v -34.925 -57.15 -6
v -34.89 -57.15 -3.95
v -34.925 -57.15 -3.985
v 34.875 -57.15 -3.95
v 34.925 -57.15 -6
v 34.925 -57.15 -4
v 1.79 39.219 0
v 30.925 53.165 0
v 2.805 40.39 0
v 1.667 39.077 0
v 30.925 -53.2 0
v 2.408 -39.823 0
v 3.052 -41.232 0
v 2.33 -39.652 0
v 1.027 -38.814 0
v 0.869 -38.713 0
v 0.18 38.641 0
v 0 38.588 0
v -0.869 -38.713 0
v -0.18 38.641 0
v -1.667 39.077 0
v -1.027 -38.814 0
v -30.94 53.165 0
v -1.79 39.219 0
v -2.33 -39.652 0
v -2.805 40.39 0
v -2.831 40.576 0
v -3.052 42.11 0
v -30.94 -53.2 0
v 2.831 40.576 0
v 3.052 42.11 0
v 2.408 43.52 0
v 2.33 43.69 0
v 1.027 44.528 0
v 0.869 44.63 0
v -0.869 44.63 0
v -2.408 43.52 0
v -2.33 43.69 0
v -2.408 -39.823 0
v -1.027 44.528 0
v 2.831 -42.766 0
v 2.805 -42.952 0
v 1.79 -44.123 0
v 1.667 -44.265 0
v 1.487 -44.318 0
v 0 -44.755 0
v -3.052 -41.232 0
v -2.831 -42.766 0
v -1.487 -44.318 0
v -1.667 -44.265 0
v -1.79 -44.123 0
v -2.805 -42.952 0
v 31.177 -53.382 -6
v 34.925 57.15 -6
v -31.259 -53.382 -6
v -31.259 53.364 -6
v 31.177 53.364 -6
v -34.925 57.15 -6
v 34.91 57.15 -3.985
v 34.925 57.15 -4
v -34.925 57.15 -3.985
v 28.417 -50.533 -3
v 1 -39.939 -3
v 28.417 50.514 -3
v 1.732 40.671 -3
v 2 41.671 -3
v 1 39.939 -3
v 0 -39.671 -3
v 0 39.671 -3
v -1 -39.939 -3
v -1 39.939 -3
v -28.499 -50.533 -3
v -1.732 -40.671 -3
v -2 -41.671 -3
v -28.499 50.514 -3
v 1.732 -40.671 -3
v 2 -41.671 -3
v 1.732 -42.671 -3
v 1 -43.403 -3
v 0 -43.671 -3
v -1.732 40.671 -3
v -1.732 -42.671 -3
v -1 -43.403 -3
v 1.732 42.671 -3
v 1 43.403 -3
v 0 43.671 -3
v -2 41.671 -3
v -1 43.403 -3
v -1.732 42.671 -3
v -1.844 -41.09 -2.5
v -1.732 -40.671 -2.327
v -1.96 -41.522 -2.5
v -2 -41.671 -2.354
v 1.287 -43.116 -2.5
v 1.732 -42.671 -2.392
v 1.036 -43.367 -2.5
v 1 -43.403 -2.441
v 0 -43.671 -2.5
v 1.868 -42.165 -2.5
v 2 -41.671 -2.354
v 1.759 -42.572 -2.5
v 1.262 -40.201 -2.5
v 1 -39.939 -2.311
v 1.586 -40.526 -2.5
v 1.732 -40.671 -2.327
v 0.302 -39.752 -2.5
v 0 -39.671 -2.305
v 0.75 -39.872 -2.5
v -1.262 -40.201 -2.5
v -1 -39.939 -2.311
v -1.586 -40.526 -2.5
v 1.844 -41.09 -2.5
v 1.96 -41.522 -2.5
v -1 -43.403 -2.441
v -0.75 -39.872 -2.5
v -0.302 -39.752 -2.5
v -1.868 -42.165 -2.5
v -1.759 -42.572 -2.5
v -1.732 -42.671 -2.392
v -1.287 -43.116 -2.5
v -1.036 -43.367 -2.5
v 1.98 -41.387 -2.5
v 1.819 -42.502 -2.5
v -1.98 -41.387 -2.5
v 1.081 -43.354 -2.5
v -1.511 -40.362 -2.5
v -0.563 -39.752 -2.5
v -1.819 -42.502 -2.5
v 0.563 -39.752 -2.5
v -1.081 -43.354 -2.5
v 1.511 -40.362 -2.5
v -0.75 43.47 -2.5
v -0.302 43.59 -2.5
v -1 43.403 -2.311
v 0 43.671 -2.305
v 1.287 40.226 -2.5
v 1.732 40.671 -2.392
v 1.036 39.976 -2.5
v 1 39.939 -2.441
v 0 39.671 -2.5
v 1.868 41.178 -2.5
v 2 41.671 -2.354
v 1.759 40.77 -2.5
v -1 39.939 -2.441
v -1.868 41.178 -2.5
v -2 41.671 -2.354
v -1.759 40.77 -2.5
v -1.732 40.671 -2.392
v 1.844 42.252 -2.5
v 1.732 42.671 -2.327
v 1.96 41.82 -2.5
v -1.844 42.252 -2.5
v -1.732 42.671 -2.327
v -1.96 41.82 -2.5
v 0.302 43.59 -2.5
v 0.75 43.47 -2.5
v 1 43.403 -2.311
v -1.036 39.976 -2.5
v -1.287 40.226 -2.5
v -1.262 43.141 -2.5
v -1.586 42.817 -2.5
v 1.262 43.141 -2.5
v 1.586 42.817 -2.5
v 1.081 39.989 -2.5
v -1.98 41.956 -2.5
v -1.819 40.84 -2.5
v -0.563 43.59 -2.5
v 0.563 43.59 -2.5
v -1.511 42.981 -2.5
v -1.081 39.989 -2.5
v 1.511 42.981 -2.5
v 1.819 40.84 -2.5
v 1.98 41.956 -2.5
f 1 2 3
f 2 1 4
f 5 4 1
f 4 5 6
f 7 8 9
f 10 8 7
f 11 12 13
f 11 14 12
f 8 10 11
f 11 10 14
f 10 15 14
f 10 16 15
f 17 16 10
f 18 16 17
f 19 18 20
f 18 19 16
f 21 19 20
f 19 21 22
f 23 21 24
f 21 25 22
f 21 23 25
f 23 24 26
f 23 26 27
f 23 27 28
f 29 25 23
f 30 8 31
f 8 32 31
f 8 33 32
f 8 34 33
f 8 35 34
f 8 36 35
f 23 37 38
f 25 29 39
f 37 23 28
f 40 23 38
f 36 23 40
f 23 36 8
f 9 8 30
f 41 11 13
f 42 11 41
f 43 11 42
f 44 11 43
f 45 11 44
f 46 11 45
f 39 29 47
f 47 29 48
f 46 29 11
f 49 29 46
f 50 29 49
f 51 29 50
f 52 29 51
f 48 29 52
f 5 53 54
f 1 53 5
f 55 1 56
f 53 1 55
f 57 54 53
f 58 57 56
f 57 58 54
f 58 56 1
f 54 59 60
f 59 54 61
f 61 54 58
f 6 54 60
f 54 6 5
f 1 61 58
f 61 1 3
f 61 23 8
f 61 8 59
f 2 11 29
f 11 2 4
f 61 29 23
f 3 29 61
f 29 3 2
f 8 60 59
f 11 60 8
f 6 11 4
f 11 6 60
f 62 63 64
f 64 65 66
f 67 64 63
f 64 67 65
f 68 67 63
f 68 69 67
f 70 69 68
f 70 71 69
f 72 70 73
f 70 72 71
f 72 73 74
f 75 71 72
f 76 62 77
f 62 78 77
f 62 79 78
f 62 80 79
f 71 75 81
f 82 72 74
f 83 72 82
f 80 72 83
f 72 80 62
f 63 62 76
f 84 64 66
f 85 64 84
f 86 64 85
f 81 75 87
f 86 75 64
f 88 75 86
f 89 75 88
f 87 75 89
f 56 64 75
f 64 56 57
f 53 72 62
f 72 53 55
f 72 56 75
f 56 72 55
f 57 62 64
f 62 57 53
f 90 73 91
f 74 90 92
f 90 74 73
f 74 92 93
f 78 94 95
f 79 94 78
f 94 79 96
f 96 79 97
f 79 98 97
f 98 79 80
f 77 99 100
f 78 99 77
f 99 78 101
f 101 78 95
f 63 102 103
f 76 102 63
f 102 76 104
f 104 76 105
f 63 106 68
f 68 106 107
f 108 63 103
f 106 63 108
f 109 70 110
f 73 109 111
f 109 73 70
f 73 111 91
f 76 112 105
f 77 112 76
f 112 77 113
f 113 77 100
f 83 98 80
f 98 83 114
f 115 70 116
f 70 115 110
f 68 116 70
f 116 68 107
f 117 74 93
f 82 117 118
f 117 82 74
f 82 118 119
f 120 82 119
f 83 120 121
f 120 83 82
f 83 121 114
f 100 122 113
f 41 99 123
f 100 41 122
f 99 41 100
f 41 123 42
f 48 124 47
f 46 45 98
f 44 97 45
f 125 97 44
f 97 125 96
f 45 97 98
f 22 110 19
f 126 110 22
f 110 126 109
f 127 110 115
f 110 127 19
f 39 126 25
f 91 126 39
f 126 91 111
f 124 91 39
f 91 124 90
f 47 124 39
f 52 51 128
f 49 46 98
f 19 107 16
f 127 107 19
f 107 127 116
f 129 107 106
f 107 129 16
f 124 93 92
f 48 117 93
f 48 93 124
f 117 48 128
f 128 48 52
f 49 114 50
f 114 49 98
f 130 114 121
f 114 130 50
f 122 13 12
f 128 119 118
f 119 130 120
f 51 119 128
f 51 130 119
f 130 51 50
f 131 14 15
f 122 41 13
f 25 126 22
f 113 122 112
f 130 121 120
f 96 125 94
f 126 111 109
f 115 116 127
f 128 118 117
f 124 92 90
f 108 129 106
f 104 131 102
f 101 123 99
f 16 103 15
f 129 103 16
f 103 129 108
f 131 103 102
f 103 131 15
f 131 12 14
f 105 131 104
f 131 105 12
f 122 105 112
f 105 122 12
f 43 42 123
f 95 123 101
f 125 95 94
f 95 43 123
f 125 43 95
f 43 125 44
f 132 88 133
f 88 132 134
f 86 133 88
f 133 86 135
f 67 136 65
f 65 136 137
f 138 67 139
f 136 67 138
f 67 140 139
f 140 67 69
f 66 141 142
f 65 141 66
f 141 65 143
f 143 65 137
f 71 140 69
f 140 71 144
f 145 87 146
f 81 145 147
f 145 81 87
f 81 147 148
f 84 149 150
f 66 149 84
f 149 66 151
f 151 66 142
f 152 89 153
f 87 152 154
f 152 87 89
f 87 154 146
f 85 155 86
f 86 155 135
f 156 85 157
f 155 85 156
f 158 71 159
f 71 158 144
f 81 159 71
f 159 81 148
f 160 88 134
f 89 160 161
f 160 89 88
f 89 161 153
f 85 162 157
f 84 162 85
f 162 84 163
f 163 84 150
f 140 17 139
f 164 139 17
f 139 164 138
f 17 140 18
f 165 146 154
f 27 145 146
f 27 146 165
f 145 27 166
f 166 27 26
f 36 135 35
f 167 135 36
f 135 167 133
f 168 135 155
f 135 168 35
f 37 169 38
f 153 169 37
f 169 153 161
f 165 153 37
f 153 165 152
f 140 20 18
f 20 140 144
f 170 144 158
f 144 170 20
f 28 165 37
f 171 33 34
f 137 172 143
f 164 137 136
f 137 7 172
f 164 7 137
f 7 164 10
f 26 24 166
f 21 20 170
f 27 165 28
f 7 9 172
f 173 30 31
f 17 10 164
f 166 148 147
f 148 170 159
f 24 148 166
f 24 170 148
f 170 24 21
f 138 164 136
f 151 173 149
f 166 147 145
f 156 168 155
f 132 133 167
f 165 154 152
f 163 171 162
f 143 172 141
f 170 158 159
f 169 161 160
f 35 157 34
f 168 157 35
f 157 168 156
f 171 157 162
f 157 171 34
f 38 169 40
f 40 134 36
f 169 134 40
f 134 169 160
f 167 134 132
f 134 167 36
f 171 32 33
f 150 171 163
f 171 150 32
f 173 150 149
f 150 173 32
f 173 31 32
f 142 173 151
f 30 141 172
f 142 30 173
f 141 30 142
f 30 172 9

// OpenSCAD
/*
	WALLY - Wall Plate Customizer v1.4
	by TheNewHobbyist 2013 (http://thenewhobbyist.com)
	http://www.thingiverse.com/thing:47956

	Most of the connectors used with this thing are panel mount connectors from
	www.DataPro.net I can't vouch for their quality but they did have easy to
	find dimensions for their products so I used them.

	This could be tightened up considerably but I thought I'd get it out there for people
	to experiment with before I lose my mind staring at it too long. Also this is my
	first OpenSCAD model so cut me some slack ;)

	Notes:

	* The plug types "Duplex Outlet", "Long_Toggle Switch", "Toggle Switch", and "Rocker"
	  will all use the entire plate when selected in top or bottom configuration. The
	  other selection (if not "none" will be selected.

	* "None" and "Blank should not be considered equal. if "None" is selected for one of
	  the two holes on a plate the other selection will be centered on that plate. If
	  "Blank" is selected that plug location will remain blank but the other selection
	  will NOT move into a centered position.

		Change Log:

		v1.4 - The "I've never used OpenSCAD in my life until yesterday" edition! :D
		- Added Keystone Jack - Dual to allow a pair of keystone jacks side-by-side.
		- Fixed a bug where the first plate spot did not build unless one of the "full plate" options are used
		- Fixed: "Liberation Mono:Bol" -> "Liberation Mono:Bold"
		- Improved layout of code... to me, at least. :)

		v1.3
		ADDED: 3 new sizes for plate export: Standard, Junior-Jumbo, and Jumbo.

		v1.2
		ADDED: Long Toggle Switch for laird

		v1.1
		UPDATED: Screw hole locations for designer and toggle plate types.
		UPDATED: Hole size for designer plate type.
		UPDATED: Outlet hole spacing

*/

  //////////////////////////
 // Customizer Settings: //
//////////////////////////

//How big are we talkin' here?
plate_width = 1; //	[1:5]

// Bigger hole in your wall? Try this
plate_size = 0; // [0:Standard, 1:Junior-Jumbo, 2:Jumbo]

//Pick a plug or full plate type
1st_plate = "none";								// ["none":None, "blank":Blank Port, "toggle":Full Plate - Toggle Switch, "long_toggle":Full Plate - Long Toggle Switch, "outlet":Full Plate - Duplex Outlet, "L5-30P", "rocker":Full Plate - Rocker/Designer Plate, "keystone1":Keystone Jack, "keystone2":Keystone Jack - Dual, "vga":VGA Port, "hdmi":HDMI Port, "dvi":DVI-I Port, "displayport":Displayport, "cat5e":Cat5e/Cat6 Port, "usb-a":USB-A Port, "usb-b":USB-B Port, "firewire":Firewire IEEE 1394 Port, "db09":DB-09 Port, "ps2":PS2 Port, "f-type": F-Type/Coaxial Port,"svideo":S-Video Port, "stereo":Stereo Headphone Jack]
//Pick a bottom plug type or leave as none
1st_plate_bottom_hole = "none";					// ["none":None, "blank":Blank Port, "keystone1":Keystone Jack, "keystone2":Keystone Jack - Dual, "vga":VGA Port, "hdmi":HDMI Port, "dvi":DVI-I Port, "displayport":Displayport, "cat5e":Cat5e/Cat6 Port, "usb-a":USB-A Port, "usb-b":USB-B Port, "firewire":Firewire IEEE 1394 Port, "db09":DB-09 Port, "ps2":PS2 Port, "f-type": F-Type/Coaxial Port,"svideo":S-Video Port, "stereo":Stereo Headphone Jack]
//Add some text on the top
1st_plate_top_text = "";
//Add some text on the bottom
1st_plate_bottom_text = "";
//Pick a plug or full plate type
2nd_plate = "none";								// ["none":None, "blank":Blank Port, "toggle":Full Plate - Toggle Switch, "long_toggle":Full Plate - Long Toggle Switch, "outlet":Full Plate - Duplex Outlet, "L5-30P", "rocker":Full Plate - Rocker/Designer Plate, "keystone1":Keystone Jack, "keystone2":Keystone Jack - Dual, "vga":VGA Port, "hdmi":HDMI Port, "dvi":DVI-I Port, "displayport":Displayport, "cat5e":Cat5e/Cat6 Port, "usb-a":USB-A Port, "usb-b":USB-B Port, "firewire":Firewire IEEE 1394 Port, "db09":DB-09 Port, "ps2":PS2 Port, "f-type": F-Type/Coaxial Port,"svideo":S-Video Port, "stereo":Stereo Headphone Jack]
//Pick a bottom plug type or leave as none
2nd_plate_bottom_hole = "none";					// ["none":None, "blank":Blank Port, "keystone1":Keystone Jack, "keystone2":Keystone Jack - Dual, "vga":VGA Port, "hdmi":HDMI Port, "dvi":DVI-I Port, "displayport":Displayport, "cat5e":Cat5e/Cat6 Port, "usb-a":USB-A Port, "usb-b":USB-B Port, "firewire":Firewire IEEE 1394 Port, "db09":DB-09 Port, "ps2":PS2 Port, "f-type": F-Type/Coaxial Port,"svideo":S-Video Port, "stereo":Stereo Headphone Jack]
//Add some text on the top
2nd_plate_top_text = "";
//Add some text on the bottom
2nd_plate_bottom_text = "";
//Pick a plug or full plate type
3rd_plate = "none";								// ["none":None, "blank":Blank Port, "toggle":Full Plate - Toggle Switch, "long_toggle":Full Plate - Long Toggle Switch, "outlet":Full Plate - Duplex Outlet, "L5-30P", "rocker":Full Plate - Rocker/Designer Plate, "keystone1":Keystone Jack, "keystone2":Keystone Jack - Dual, "vga":VGA Port, "hdmi":HDMI Port, "dvi":DVI-I Port, "displayport":Displayport, "cat5e":Cat5e/Cat6 Port, "usb-a":USB-A Port, "usb-b":USB-B Port, "firewire":Firewire IEEE 1394 Port, "db09":DB-09 Port, "ps2":PS2 Port, "f-type": F-Type/Coaxial Port,"svideo":S-Video Port, "stereo":Stereo Headphone Jack]
//Pick a bottom plug type or leave as none
3rd_plate_bottom_hole = "none";					// ["none":None, "blank":Blank Port, "keystone1":Keystone Jack, "keystone2":Keystone Jack - Dual, "vga":VGA Port, "hdmi":HDMI Port, "dvi":DVI-I Port, "displayport":Displayport, "cat5e":Cat5e/Cat6 Port, "usb-a":USB-A Port, "usb-b":USB-B Port, "firewire":Firewire IEEE 1394 Port, "db09":DB-09 Port, "ps2":PS2 Port, "f-type": F-Type/Coaxial Port,"svideo":S-Video Port, "stereo":Stereo Headphone Jack]
//Add some text on the top
3rd_plate_top_text = "";
//Add some text on the bottom
3rd_plate_bottom_text = "";
//Pick a plug or full plate type
4th_plate = "none";								// ["none":None, "blank":Blank Port, "toggle":Full Plate - Toggle Switch, "long_toggle":Full Plate - Long Toggle Switch, "outlet":Full Plate - Duplex Outlet, "L5-30P", "rocker":Full Plate - Rocker/Designer Plate, "keystone1":Keystone Jack, "keystone2":Keystone Jack - Dual, "vga":VGA Port, "hdmi":HDMI Port, "dvi":DVI-I Port, "displayport":Displayport, "cat5e":Cat5e/Cat6 Port, "usb-a":USB-A Port, "usb-b":USB-B Port, "firewire":Firewire IEEE 1394 Port, "db09":DB-09 Port, "ps2":PS2 Port, "f-type": F-Type/Coaxial Port,"svideo":S-Video Port, "stereo":Stereo Headphone Jack]
//Pick a bottom plug type or leave as none
4th_plate_bottom_hole = "none";					// ["none":None, "blank":Blank Port, "keystone1":Keystone Jack, "keystone2":Keystone Jack - Dual, "vga":VGA Port, "hdmi":HDMI Port, "dvi":DVI-I Port, "displayport":Displayport, "cat5e":Cat5e/Cat6 Port, "usb-a":USB-A Port, "usb-b":USB-B Port, "firewire":Firewire IEEE 1394 Port, "db09":DB-09 Port, "ps2":PS2 Port, "f-type": F-Type/Coaxial Port,"svideo":S-Video Port, "stereo":Stereo Headphone Jack]
//Add some text on the top
4th_plate_top_text = "";
//Add some text on the bottom
4th_plate_bottom_text = "";
//Pick a plug or full plate type
5th_plate = "none";								// ["none":None, "blank":Blank Port, "toggle":Full Plate - Toggle Switch, "long_toggle":Full Plate - Long Toggle Switch, "outlet":Full Plate - Duplex Outlet, "L5-30P", "rocker":Full Plate - Rocker/Designer Plate, "keystone1":Keystone Jack, "keystone2":Keystone Jack - Dual, "vga":VGA Port, "hdmi":HDMI Port, "dvi":DVI-I Port, "displayport":Displayport, "cat5e":Cat5e/Cat6 Port, "usb-a":USB-A Port, "usb-b":USB-B Port, "firewire":Firewire IEEE 1394 Port, "db09":DB-09 Port, "ps2":PS2 Port, "f-type": F-Type/Coaxial Port,"svideo":S-Video Port, "stereo":Stereo Headphone Jack]
//Pick a bottom plug type or leave as none
5th_plate_bottom_hole = "none";					// ["none":None, "blank":Blank Port, "keystone1":Keystone Jack, "keystone2":Keystone Jack - Dual, "vga":VGA Port, "hdmi":HDMI Port, "dvi":DVI-I Port, "displayport":Displayport, "cat5e":Cat5e/Cat6 Port, "usb-a":USB-A Port, "usb-b":USB-B Port, "firewire":Firewire IEEE 1394 Port, "db09":DB-09 Port, "ps2":PS2 Port, "f-type": F-Type/Coaxial Port,"svideo":S-Video Port, "stereo":Stereo Headphone Jack]
//Add some text on the top
5th_plate_top_text = "";
//Add some text on the bottom
5th_plate_bottom_text = "";

  //////////////////////
 // Static Settings: //
//////////////////////

module GoAwayCustomizer()
{
	// This module is here to stop Customizer from picking up the variables below
}

plates = [1st_plate, 2nd_plate, 3rd_plate, 4th_plate, 5th_plate];
bottom_plates = [1st_plate_bottom_hole, 2nd_plate_bottom_hole, 3rd_plate_bottom_hole, 4th_plate_bottom_hole, 5th_plate_bottom_hole];
top_texts = [1st_plate_top_text, 2nd_plate_top_text, 3rd_plate_top_text, 4th_plate_top_text, 5th_plate_top_text];
bottom_texts = [1st_plate_bottom_text, 2nd_plate_bottom_text, 3rd_plate_bottom_text, 4th_plate_bottom_text, 5th_plate_bottom_text];

l_offset = [34.925, 39.6875, 44.45];
r_offset = [34.925, 39.6875, 44.45];
spacer = [0, 0, 46.0375, 92.075, 138.1125, 184.15];
solid_plate_width = l_offset[plate_size] + spacer[plate_width] + r_offset[plate_size];

height_sizes = [114.3, 123.825, 133.35];

height = 114.3; //plate height (static)
gang_width = [0, 69.86, 115.824, 161.925, 206.375, 254]; // Plate widths (standard)

edgewidth = solid_plate_width + 10; // Bevel setting for top and bottom
rightbevel = solid_plate_width - 4; // Bevel for right side (scales)

left_offset = 34.925; // Offset first hole position
switch_offset = 46.0375; // Offset all additional holes
thinner_offset = [0, 0.92, 0.95, 0.96, 0.97, 0.973]; // Manual fix for right side wackiness

positions = [height_sizes[plate_size] / 2, height_sizes[plate_size] / 2 - 14.25, height_sizes[plate_size] / 2 + 14.25];



  ///////////////////
 // Hole Control: //
///////////////////
module plate_text(text, offset, plate_number, size = 8)
{
    echo (positions[0]);
    translate([offset + (plate_size * 4.5), l_offset[plate_size] + (plate_number * switch_offset), 4])
    rotate([0, 0, 90])
    linear_extrude(40)
    text(text, halign = "center", size = size, font = "Liberation Mono:Bold");
    
}

module plate(plate = 1)
{
    plate_index = plate - 1; // indexes are zero based
    
    if (plates[plate_index] == "L5-30P")
    {
        plate_text(top_texts[plate_index], 20, plate_index);
        plate_text(bottom_texts[plate_index], 104, plate_index);
		translate([0, l_offset[plate_size] + switch_offset * plate_index, 0]) toggle_screws();
		translate([0, l_offset[plate_size] + switch_offset * plate_index, 0]) hole(plates[plate_index]);        
    }
    else if (plates[plate_index] == "toggle" || bottom_plates[plate_index] == "toggle")
    {
        plate_text(top_texts[plate_index], 20, plate_index);
        plate_text(bottom_texts[plate_index], 104, plate_index);
		translate([0, l_offset[plate_size] + switch_offset * plate_index, 0]) toggle_screws();
		translate([0, l_offset[plate_size] + switch_offset * plate_index, 0]) hole(plates[plate_index]);
    }
    else if (plates[plate_index] == "long_toggle" || bottom_plates[plate_index] == "long_toggle")
    {
        plate_text(top_texts[plate_index], 20, plate_index);
        plate_text(bottom_texts[plate_index], 104, plate_index);
		translate([0, l_offset[plate_size] + switch_offset * plate_index, 0]) toggle_screws();
		translate([0, l_offset[plate_size] + switch_offset * plate_index, 0]) hole(plates[plate_index]);
	}
	else if (plates[plate_index] == "rocker" || bottom_plates[plate_index] == "rocker")
	{
        plate_text(top_texts[plate_index], 21, plate_index);
        plate_text(bottom_texts[plate_index], 101, plate_index);
		translate([0, l_offset[plate_size] + switch_offset * plate_index, 0]) rocker_screws();
		translate([0, l_offset[plate_size] + switch_offset * plate_index, 0]) hole(plates[plate_index]);
	}
	else if (plates[plate_index] == "outlet" || bottom_plates[plate_index] == "outlet")
	{
        plate_text(top_texts[plate_index], 20, plate_index);
        plate_text(bottom_texts[plate_index], 104, plate_index);
        translate([0, l_offset[plate_size] + switch_offset * plate_index, 0]) hole(plates[plate_index]);
	}
	else if (bottom_plates[plate_index] == "none")
	{
        plate_text(top_texts[plate_index], 30, plate_index);
        plate_text(bottom_texts[plate_index], 94, plate_index);
		translate([0, l_offset[plate_size] + switch_offset * plate_index, 0]) box_screws();
		translate([positions[0], l_offset[plate_size] + switch_offset * plate_index, 0]) hole(plates[plate_index]);
	}
	else if (plates[plate_index] == "none")
	{
        plate_text(top_texts[plate_index], 20, plate_index);
        plate_text(bottom_texts[plate_index], 104, plate_index);
		translate([0, l_offset[plate_size] + switch_offset * plate_index, 0]) box_screws();
		translate([positions[0], l_offset[plate_size] + switch_offset * plate_index, 0]) hole(bottom_plates[plate_index]);
	}
    else if (plate_index >= 0)
    {
        plate_text(top_texts[plate_index], 30, plate_index);
        plate_text(bottom_texts[plate_index], 94, plate_index);
        translate([0, l_offset[plate_size] + switch_offset * plate_index, 0]) box_screws();
        translate([positions[1], l_offset[plate_size] + switch_offset * plate_index, 0]) hole(plates[plate_index]);
        translate([positions[2], l_offset[plate_size] + switch_offset * plate_index, 0]) hole(bottom_plates[plate_index]);
	}
}


  /////////////////
 // SolidWorks: //
/////////////////
module plate_solid(plate = 1)
{
    plate_index = plate - 1; // indexes are zero based

    echo("plate number: ", plate, "plate multiplier: ", plate_index, "plate index: ", plate_index);

	if (plates[plate_index] == "keystone1" && bottom_plates[plate_index] == "none")
	{
		translate([height_sizes[plate_size] / 2 + 14.3, l_offset[plate_size] - 11.5 + switch_offset * plate_index, -3.9]) hole("keystone_solid");
	}
	else if (plates[plate_index] == "keystone1" && bottom_plates[plate_index] != "outlet" && bottom_plates[plate_index] != "toggle" && bottom_plates[plate_index] != "rocker")
	{
		translate([height_sizes[plate_size] / 2, l_offset[plate_size] - 11.5 + switch_offset * plate_index, -3.9]) hole("keystone_solid");
	}

	if (bottom_plates[plate_index] == "keystone1" && plates[plate_index] == "none")
	{
		translate([height_sizes[plate_size] / 2 + 14.3, l_offset[plate_size] - 11.5 + switch_offset * plate_index, -3.9]) hole("keystone_solid");
	}
	else if (bottom_plates[plate_index] == "keystone1" && plates[plate_index] != "outlet" && plates[plate_index] != "toggle" && plates[plate_index] != "rocker")
	{
		translate([height_sizes[plate_size]/2 + 28.5, l_offset[plate_size] - 11.5 + switch_offset * plate_index, -3.9]) hole("keystone_solid");
	}



	if (plates[plate_index] == "keystone2" && bottom_plates[plate_index] == "none")
	{
		translate([height_sizes[plate_size] / 2 + 14.3, l_offset[plate_size] - 11.5 + switch_offset * plate_index, -3.9]) hole("keystone2_solid");
	}
	else if (plates[plate_index] == "keystone2" && bottom_plates[plate_index] != "outlet" && bottom_plates[plate_index] != "toggle" && bottom_plates[plate_index] != "rocker")
	{
		translate([height_sizes[plate_size] / 2, l_offset[plate_size] - 11.5 + switch_offset * plate_index, -3.9]) hole("keystone2_solid");
	}

	if (bottom_plates[plate_index] == "keystone2" && plates[plate_index] == "none")
	{
		translate([height_sizes[plate_size] / 2 + 14.3, l_offset[plate_size] - 11.5 + switch_offset * plate_index, -3.9]) hole("keystone2_solid");
	}
	else if (bottom_plates[plate_index] == "keystone2" && plates[plate_index] != "outlet" && plates[plate_index] != "toggle" && plates[plate_index] != "rocker")
	{
		translate([height_sizes[plate_size]/2 + 28.5, l_offset[plate_size] - 11.5 + switch_offset * plate_index, -3.9]) hole("keystone2_solid");
	}

}

  ///////////////////
 // PlateStation: //
///////////////////

//Plate size and bevel
module base_plate()
{
	difference()
	{
		cube([height_sizes[plate_size],solid_plate_width,6]);
		translate([-4.3, -5, 6.2]) rotate([0, 45, 0]) cube([6, edgewidth, 6]); //Top Bevel
		translate([height_sizes[plate_size] - 4.2, -5, 6.25]) rotate([0, 45, 0]) cube([6, edgewidth, 6]); //Bottom Bevel
		translate([height_sizes[plate_size] + 10, -4.4, 6.1]) rotate([0, 45, 90]) cube([6, height_sizes[plate_size] + 20, 6]); //Left Bevel (doesn't change)
		translate([height_sizes[plate_size] + 10, rightbevel, 6]) rotate([0, 45, 90]) cube([6, height_sizes[plate_size] + 10, 6]); //Right Bevel (scales right)
	}
}


// Thinning Plate
module plate_inner()
{
	scale([0.95,thinner_offset[plate_width],1])
	{
		translate([3,3,0])
		{
			difference()
			{
				cube([height_sizes[plate_size], solid_plate_width, 6]);
				translate([-4.3, -5, 6.2]) rotate([0, 45, 0]) cube([6, edgewidth, 6]); //Top Bevel
				translate([height_sizes[plate_size] - 4.2, -5, 6.25]) rotate([0, 45, 0]) cube([6, edgewidth, 6]); //Bottom Bevel
				translate([height_sizes[plate_size] + 10, -4.4, 6.1]) rotate([0, 45, 90]) cube([6, height_sizes[plate_size] + 20, 6]); //Left Bevel (doesn't change)
				translate([height_sizes[plate_size] + 10, rightbevel, 6]) rotate([0, 45, 90]) cube([6, height_sizes[plate_size] + 10, 6]); //Right Bevel (scales right)
			}
		}
	}
}

// Box screw holes
module box_screws()
{
	translate([height_sizes[plate_size] / 2 + 41.67125, 0, -1]) cylinder(r = 2, h = 10, $fn = 12);
	translate([height_sizes[plate_size] / 2 + 41.67125, 0, 3.5]) cylinder(r1 = 2, r2 = 3.3, h = 3);
	translate([height_sizes[plate_size] / 2 - 41.67125, 0, -1]) cylinder(r = 2, h = 10, $fn = 12);
	translate([height_sizes[plate_size] / 2 - 41.67125, 0, 3.5]) cylinder(r1 = 2, r2 = 3.3, h = 3);
	}

// Rocker/Designer screw holes
module rocker_screws()
{
	translate([height_sizes[plate_size] / 2 + 48.41875, 0, -1]) cylinder(r = 2, h = 10, $fn = 12);
	translate([height_sizes[plate_size] / 2 + 48.41875, 0, 3.5]) cylinder(r1 = 2, r2 = 3.3, h = 3);
	translate([height_sizes[plate_size] / 2 - 48.41875, 0, -1]) cylinder(r = 2, h = 10, $fn = 12);
	translate([height_sizes[plate_size] / 2 - 48.41875, 0, 3.5]) cylinder(r1 = 2, r2 = 3.3, h = 3);
}

// Toggle screw holes
module toggle_screws()
{
	translate([height_sizes[plate_size] / 2 + 30.1625, 0, -1]) cylinder(r = 2, h = 10, $fn = 12);
	translate([height_sizes[plate_size] / 2 + 30.1625, 0, 3.5]) cylinder(r1 = 2, r2 = 3.3, h = 3);
	translate([height_sizes[plate_size] / 2 - 30.1625, 0, -1]) cylinder(r = 2, h = 10, $fn = 12);
	translate([height_sizes[plate_size] / 2 - 30.1625, 0, 3.5]) cylinder(r1 = 2, r2 = 3.3, h = 3);
}

  ///////////////
 // Portland: //
///////////////

// Hole Cutout definitions
module hole(hole_type)
{
	// L5-30P outlet hole
    if (hole_type == "L5-30P")
    {
		translate([height_sizes[plate_size] / 2, 0, 0]) cylinder(d = 35.5, h = 500, center = true);
		//cylinder(h=100, r=50);
    }


	// Toggle switch hole
	if (hole_type == "toggle")
	{
		translate([height_sizes[plate_size] / 2, 0, 0]) cube([23.8125, 10.3188, 15], center = true);
	}

	// Toggle switch hole and screw holes
	if (hole_type == "long_toggle")
	{
		translate([height_sizes[plate_size] / 2, 0, 0]) cube([43.6563, 11.9063, 15], center = true);
	}

	// Rocker switch plate
	if (hole_type == "rocker")
	{
		translate([height_sizes[plate_size] / 2, 0, 0]) cube([67.1, 33.3, 15], center = true);
	}

	// Duplex power outlet plate or dual side toggles
	if (hole_type == "outlet" || hole_type == "dualsidetoggle")
	{
		translate([height_sizes[plate_size] / 2 + 19.3915, 0, 0])
		{
			difference()
			{
				cylinder(r = 17.4625, h = 15, center = true);
				translate([-24.2875, -15, -2]) cube([10, 37, 15], center = false);
				translate([14.2875, -15, -2]) cube([10, 37, 15], center = false);
			}
		}

		translate([height_sizes[plate_size]/2 - 19.3915,0,0])
		{
			difference()
			{
				cylinder(r = 17.4625, h = 15, center = true);
				translate([-24.2875, -15, -2]) cube([10, 37, 15], center = false);
				translate([14.2875, -15, -2]) cube([10, 37, 15], center = false);
			}
		}

		translate([height_sizes[plate_size] / 2, 0, -1]) cylinder(r = 2, h = 10);
		translate([height_sizes[plate_size] / 2, 0, 3.5]) cylinder(r1 = 2, r2 = 3.3, h = 3);
	}

	// Blank plate
	if (hole_type == "blank") {}

	// VGA & DB09 plate
	// VGA Fits http://www.datapro.net/products/vga-dual-panel-mount-f-f-cable.html
	// DB09 Fits http://www.datapro.net/products/db9-serial-panel-mount-male-extension.html
	if (hole_type == "vga" || hole_type == "db09")
	{
		translate([0, -12.5, 3]) cylinder(r = 1.75, h = 10, center = true);
		translate([0, 12.5, 3]) cylinder(r = 1.75, h = 10, center = true);
		difference()
		{
			cube([10, 19, 13], center = true);
			translate([-5, -9.2, 1]) rotate([0, 0, -35.6]) cube([4.4, 2.4, 15], center = true);
			translate([.9, -11.2, 0]) rotate([0, 0, 9.6]) cube([10, 4.8, 15], center = true);
			translate([4.6, -8.5, 0]) rotate([0, 0, 37.2]) cube([4.4, 2.4, 15], center = true);
			translate([-5, 9.2, 1]) rotate([0, 0, 35.6]) cube([4.4, 2.4, 15], center = true);
			translate([0.9, 11.2, 0]) rotate([0, 0, -9.6]) cube([10, 4.8, 15], center = true);
			translate([4.6, 8.5, 0]) rotate([0, 0, -37.2]) cube([4.4, 2.4, 15], center = true);
		}
	}

	// HDMI plate
	// Fits http://www.datapro.net/products/hdmi-panel-mount-extension-cable.html
	if (hole_type == "hdmi")
	{
		translate([0, -13, 3]) cylinder(r = 1.75, h = 10, center = true);
		translate([0, 13, 3]) cylinder(r = 1.75, h = 10, center = true);
		translate([0, 0, 3]) cube([6, 16, 10], center = true);
	}

	// DVI-I plate
	// Fits http://www.datapro.net/products/dvi-i-panel-mount-extension-cable.html
	if (hole_type == "dvi")
	{
		translate([0, -16, 3]) cylinder(r = 1.75, h = 10, center = true);
		translate([0, 16, 3]) cylinder(r = 1.75, h = 10, center = true);
		translate([0, 0, 3]) cube([10, 26, 10], center = true);
	}

	// DisplayPort plate
	// Fits http://www.datapro.net/products/dvi-i-panel-mount-extension-cable.html
	if (hole_type == "displayport")
	{
		translate([0, -13.5, 3]) cylinder(r = 1.75, h = 10, center = true);
		translate([0, 13.5, 3]) cylinder(r = 1.75, h = 10, center = true);
		translate([0, 0, 0])
		{
			difference()
			{
				translate([0, 0, 3]) cube([7, 19, 10], center = true);
				translate([2.47, -9.37, 3]) rotate([0, 0, -54.6]) cube([3, 5, 14], center = true);
			}
		}
	}

	// USB-A Plate
	// Fits http://www.datapro.net/products/usb-panel-mount-type-a-cable.html
	if (hole_type == "usb-a")
	{
		translate([0, -15, 3]) cylinder(r = 1.75, h = 10, center = true);
		translate([0, 15, 3]) cylinder(r = 1.75, h = 10, center = true);
		translate([0, 0, 3]) cube([8, 16, 10], center = true);
	}

	// USB-B Plate
	// Fits http://www.datapro.net/products/usb-panel-mount-type-b-cable.html
	if (hole_type == "usb-b")
	{
		translate([0, -13, 3]) cylinder(r = 1.75, h = 10, center = true);
		translate([0, 13, 3]) cylinder(r = 1.75, h = 10, center = true);
		translate([0, 0, 3]) cube([11, 12, 10], center = true);
	}

	// 1394 Firewire Plate
	// Fits http://www.datapro.net/products/firewire-panel-mount-extension.html
	if (hole_type == "firewire")
	{
		translate([0, -13.5, 3]) cylinder(r = 1.75, h = 10, center = true);
		translate([0, 13.5, 3]) cylinder(r = 1.75, h = 10, center = true);
		translate([0, 0, 3]) cube([7, 12, 10], center = true);
	}

	// F-Type / Cable TV Plate
	// Fits http://www.datapro.net/products/f-type-panel-mounting-coupler.html
	if (hole_type == "f-type")
	{
		translate([0, 0, 3]) cylinder(r = 4.7625, h = 10, center = true);
	}

	// Cat5e & Gat6 plate
	// Cat5e Fits http://www.datapro.net/products/cat-5e-panel-mount-ethernet.html
	// Cat6 Fits hhttp://www.datapro.net/products/cat-6-panel-mount-ethernet.html
	if (hole_type == "cat5e" || hole_type == "cat6")
	{
		translate([0, -12.5, 3]) cylinder(r = 1.75, h = 10, center = true);
		translate([0, 12.5, 3]) cylinder(r = 1.75, h = 10, center = true);
		translate([0, 0, 3]) cube([15, 15, 10], center = true);
	}

	// S-Video & PS2 plate
	// S-Video Fits hhttp://www.datapro.net/products/cat-6-panel-mount-ethernet.html
	// PS2 http://www.datapro.net/products/ps2-panel-mount-extension-cable.html
	if (hole_type == "svideo" || hole_type == "ps2")
	{
		translate([0, -10, 3]) cylinder(r = 1.75, h = 10, center = true);
		translate([0, 10, 3]) cylinder(r = 1.75, h = 10, center = true);
		translate([0, 0, 3]) cylinder(r = 5, h = 10, center = true);
	}


	// Stereo / 1/4" headphone jack coupler
	// Stereo coupler Fits http://www.datapro.net/products/stereo-panel-mount-coupler.html
	if (hole_type == "stereo")
	{
		translate([0, 0, 3]) cylinder(r = 2.985, h = 10, center = true);
	}

	//Keystone1 hole
	//Hole for 1 Keystone Jack
	if (hole_type == "keystone1")
	{
		translate([0, 0, 5])
		cube([16.5, 15, 10], center = true);
	}

	//Keystone2 hole
	//Hole for 1 Keystone Jack - Dual
	if (hole_type == "keystone2")
	{
		translate([0, -13, 0])
		{
			translate([-8.25, -7, 2])
			cube([16.5, 15, 10]);
		}

		translate([0, 12, 0])
		{
			translate([-8.25, -7, 2])
			cube([16.5, 15, 10]);
		}
	}

	//Keystone Solids
	if (hole_type == "keystone_solid")
	{
		rotate([0, 0, 90])
		{
			difference()
			{
				translate([0, 0, .1]) cube([23, 30.5, 9.8]);
				translate([4, 4, 0])
				{
					difference()
					{
						cube([15, 22.5, 10]);
						translate([-1, -0.001, 3.501]) cube([17, 2, 6.5]);
						translate([-1, 2.5, -3.40970]) rotate([45, 0, 0]) cube([17, 2, 6.5]);
						translate([-1, 18.501, 6.001]) cube([17, 4, 4]);
						translate([-1, 20.5, 0]) rotate([-45, 0, 0]) cube([17, 2, 6.5]);
					}
				}
			}
		}
	}

	if (hole_type == "keystone2_solid")
	{
		translate([0, 12.5, 0])
		{
			rotate([0, 0, 90])
			{
				difference()
				{
					translate([0, 0, .1]) cube([23, 30.5, 9.8]);
					translate([4, 4, 0])
					{
						difference()
						{
							cube([15, 22.5, 10]);
							translate([-1, -0.001, 3.501]) cube([17, 2, 6.5]);
							translate([-1, 2.5, -3.40970]) rotate([45, 0, 0]) cube([17, 2, 6.5]);
							translate([-1, 18.501, 6.001]) cube([17, 4, 4]);
							translate([-1, 20.5, 0]) rotate([-45, 0, 0]) cube([17, 2, 6.5]);
						}
					}
				}
			}
		}

		translate([0, -12.5, 0])
		{
			rotate([0, 0, 90])
			{
				difference()
				{
					translate([0, 0, .1]) cube([23, 30.5, 9.8]);
					translate([4, 4, 0])
					{
						difference()
						{
							cube([15, 22.5, 10]);
							translate([-1, -0.001, 3.501]) cube([17, 2, 6.5]);
							translate([-1, 2.5, -3.40970]) rotate([45, 0, 0]) cube([17, 2, 6.5]);
							translate([-1, 18.501, 6.001]) cube([17, 4, 4]);
							translate([-1, 20.5, 0]) rotate([-45, 0, 0]) cube([17, 2, 6.5]);
						}
					}
				}
			}
		}
	}
}

  ////////////////////////
 // Number One ENGAGE: //
////////////////////////

// Rotate so it sits correctly on plate (whoops) and make right side up to ensure a smnoother face (if you use monotonic ironing, anyway)
rotate([0, 0, -90])
{
    // put plate at 0,0,0 for easier printing
    translate([-height_sizes[plate_size] / 2, -solid_plate_width / 2, -6])
    {
        difference()
        {
            base_plate();
            translate([0, 0, -3]) plate_inner();
            
            for (w = [0:plate_width])
            {
                plate(w);
            }
        }
        union()
        {
            for (w = [0:plate_width])
            {
                plate_solid(w);
            }    
        }
    }
}
